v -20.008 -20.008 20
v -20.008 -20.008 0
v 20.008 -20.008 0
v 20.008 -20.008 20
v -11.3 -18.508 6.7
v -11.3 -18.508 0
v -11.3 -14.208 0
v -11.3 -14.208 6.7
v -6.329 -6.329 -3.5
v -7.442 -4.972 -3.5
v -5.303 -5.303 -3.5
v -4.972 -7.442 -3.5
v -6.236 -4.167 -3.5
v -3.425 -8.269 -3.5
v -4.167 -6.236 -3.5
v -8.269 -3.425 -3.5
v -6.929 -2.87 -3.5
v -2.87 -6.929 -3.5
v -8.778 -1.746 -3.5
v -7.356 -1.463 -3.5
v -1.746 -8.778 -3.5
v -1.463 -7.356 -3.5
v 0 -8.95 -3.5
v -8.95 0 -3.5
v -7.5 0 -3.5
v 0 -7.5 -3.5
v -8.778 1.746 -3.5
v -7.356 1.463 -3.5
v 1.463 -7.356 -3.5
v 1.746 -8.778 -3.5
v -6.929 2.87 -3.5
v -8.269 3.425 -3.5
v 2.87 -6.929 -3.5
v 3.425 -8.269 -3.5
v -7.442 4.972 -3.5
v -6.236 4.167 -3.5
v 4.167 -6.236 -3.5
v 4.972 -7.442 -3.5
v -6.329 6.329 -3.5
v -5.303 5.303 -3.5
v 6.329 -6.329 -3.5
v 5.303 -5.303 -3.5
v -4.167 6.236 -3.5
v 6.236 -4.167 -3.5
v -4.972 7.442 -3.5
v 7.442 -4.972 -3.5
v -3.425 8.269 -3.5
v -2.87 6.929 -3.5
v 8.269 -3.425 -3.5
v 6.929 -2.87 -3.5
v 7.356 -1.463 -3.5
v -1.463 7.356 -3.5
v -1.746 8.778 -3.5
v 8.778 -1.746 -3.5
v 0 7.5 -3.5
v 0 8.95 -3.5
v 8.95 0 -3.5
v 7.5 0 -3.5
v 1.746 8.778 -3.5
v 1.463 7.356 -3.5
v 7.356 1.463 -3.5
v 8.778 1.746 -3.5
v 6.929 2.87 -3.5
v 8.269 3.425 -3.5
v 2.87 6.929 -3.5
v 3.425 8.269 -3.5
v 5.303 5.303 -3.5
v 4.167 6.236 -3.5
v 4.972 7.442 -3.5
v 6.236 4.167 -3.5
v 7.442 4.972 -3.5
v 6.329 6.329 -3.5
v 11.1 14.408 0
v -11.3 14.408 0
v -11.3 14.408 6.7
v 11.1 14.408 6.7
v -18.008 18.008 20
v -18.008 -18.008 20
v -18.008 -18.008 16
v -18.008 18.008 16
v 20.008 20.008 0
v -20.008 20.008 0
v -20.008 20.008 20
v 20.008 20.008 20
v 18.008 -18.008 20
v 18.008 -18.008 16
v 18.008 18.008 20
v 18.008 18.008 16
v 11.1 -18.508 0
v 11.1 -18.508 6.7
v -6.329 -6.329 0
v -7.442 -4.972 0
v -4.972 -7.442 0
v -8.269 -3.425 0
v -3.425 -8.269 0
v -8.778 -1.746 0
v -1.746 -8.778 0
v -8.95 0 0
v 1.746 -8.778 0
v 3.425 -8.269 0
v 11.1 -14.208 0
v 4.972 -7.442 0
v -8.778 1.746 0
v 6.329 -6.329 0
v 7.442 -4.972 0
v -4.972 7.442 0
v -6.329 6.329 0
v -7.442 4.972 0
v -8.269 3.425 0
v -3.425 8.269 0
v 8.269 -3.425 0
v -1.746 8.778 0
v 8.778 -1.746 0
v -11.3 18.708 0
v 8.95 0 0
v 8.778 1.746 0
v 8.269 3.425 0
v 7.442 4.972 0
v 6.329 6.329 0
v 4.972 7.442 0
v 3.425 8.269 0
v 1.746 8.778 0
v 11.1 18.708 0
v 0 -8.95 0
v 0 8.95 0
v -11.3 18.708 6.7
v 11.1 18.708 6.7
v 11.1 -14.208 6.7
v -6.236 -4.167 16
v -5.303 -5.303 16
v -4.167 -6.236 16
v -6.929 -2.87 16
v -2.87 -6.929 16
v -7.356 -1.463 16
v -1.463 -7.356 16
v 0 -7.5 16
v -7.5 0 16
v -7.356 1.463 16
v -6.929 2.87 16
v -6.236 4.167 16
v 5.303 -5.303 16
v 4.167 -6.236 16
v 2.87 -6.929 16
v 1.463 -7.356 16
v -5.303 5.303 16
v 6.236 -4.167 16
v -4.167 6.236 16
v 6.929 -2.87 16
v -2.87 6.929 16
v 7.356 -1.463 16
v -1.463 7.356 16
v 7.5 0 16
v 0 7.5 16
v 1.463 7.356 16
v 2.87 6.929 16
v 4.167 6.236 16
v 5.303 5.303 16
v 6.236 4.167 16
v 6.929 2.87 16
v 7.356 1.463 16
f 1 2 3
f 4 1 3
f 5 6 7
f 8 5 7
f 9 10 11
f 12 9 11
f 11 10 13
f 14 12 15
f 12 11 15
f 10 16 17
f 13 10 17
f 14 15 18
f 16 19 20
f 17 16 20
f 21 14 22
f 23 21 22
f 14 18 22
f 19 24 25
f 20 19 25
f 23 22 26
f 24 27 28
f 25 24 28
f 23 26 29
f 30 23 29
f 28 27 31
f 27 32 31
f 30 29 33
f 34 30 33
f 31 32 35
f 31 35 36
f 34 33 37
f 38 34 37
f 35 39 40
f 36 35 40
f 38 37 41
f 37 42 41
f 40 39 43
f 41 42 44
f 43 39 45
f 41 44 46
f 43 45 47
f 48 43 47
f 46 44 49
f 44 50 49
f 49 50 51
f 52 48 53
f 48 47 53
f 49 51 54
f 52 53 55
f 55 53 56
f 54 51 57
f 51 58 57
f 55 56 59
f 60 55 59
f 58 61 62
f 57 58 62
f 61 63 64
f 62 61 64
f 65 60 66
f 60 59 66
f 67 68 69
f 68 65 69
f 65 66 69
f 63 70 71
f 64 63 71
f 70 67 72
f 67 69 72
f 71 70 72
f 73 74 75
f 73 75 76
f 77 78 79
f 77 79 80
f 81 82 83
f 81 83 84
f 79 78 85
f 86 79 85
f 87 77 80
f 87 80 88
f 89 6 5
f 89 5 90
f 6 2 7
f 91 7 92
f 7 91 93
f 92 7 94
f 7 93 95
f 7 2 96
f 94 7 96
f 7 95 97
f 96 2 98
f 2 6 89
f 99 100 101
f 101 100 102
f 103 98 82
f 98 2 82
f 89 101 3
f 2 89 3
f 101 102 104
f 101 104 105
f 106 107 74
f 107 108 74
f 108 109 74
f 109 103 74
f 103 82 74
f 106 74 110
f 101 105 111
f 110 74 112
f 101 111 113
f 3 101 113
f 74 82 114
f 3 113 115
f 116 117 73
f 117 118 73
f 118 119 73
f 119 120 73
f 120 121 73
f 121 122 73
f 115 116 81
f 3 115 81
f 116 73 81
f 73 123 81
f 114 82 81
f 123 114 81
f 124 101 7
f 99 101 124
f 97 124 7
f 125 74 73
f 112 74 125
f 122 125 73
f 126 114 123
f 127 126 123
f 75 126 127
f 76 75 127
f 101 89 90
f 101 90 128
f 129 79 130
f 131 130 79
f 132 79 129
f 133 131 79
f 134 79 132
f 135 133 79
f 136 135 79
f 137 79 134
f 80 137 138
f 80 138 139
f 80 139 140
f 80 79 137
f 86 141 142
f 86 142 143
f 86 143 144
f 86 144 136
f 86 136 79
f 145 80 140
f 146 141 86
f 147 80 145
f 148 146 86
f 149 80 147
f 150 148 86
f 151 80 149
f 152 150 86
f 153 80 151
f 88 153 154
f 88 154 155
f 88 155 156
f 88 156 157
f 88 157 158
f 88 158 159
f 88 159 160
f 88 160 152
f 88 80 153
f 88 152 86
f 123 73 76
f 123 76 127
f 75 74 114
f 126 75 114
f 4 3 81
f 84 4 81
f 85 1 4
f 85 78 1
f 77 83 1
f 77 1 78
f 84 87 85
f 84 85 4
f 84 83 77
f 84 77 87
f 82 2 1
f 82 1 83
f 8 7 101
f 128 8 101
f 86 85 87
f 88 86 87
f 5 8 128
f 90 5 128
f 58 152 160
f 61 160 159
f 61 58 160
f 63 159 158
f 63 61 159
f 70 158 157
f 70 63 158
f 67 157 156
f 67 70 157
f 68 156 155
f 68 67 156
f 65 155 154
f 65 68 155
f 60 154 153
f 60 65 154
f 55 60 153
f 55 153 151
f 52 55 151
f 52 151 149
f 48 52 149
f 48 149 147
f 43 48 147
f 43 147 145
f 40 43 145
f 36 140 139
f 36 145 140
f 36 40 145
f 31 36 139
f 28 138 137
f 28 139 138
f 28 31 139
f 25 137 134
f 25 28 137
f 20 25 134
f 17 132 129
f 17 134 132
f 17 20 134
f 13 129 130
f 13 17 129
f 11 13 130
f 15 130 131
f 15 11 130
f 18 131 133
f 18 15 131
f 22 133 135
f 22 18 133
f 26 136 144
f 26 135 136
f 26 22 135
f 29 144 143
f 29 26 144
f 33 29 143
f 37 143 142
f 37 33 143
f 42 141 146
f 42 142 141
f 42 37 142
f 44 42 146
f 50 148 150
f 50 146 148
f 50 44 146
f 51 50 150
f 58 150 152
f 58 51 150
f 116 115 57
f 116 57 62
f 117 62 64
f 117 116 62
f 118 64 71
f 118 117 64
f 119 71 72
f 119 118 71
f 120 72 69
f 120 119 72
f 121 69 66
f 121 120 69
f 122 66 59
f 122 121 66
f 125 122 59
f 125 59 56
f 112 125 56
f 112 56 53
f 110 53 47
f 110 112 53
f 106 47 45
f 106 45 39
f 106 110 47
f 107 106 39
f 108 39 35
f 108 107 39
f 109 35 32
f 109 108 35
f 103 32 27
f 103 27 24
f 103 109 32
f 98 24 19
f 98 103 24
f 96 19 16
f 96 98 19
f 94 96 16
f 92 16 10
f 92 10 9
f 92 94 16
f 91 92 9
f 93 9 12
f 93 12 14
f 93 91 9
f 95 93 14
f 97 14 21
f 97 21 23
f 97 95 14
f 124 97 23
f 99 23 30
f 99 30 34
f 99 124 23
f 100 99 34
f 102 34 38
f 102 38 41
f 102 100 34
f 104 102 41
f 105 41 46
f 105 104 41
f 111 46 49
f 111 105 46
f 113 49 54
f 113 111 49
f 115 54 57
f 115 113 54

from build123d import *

# Parameters (mm, degrees)
SKETCH1_W           = 40.015172748
SKETCH1_H           = 40.015172748
BOSS_EXTRUDE1_DEPTH = 20
SKETCH1_3_R         = 8.95
SKETCH1_3_R_2       = 7.5
BOSS_EXTRUDE2_DEPTH = 3.5
SKETCH1_4_R         = 7.5
CUT_EXTRUDE1_DEPTH  = 35.649776695
SKETCH1_5_W         = 22.4
SKETCH1_5_H         = 4.3
CUT_EXTRUDE2_DEPTH  = 6.7
SKETCH7_W           = 36.015172748
SKETCH7_H           = 36.015172748
CUT_EXTRUDE3_DEPTH  = 4


with BuildPart() as part:
    # Sketch1 → Boss-Extrude1 (new body)
    with BuildSketch(Plane.XY):
        Rectangle(SKETCH1_W, SKETCH1_H)
    extrude(amount=BOSS_EXTRUDE1_DEPTH)

    # Sketch1<3> → Boss-Extrude2 (add)
    with BuildSketch(Plane.XY):
        Circle(SKETCH1_3_R)
        Circle(SKETCH1_3_R_2, mode=Mode.SUBTRACT)
    extrude(amount=-BOSS_EXTRUDE2_DEPTH)

    # Sketch1<4> → Cut-Extrude1 (cut, through all)
    with BuildSketch(Plane.XY):
        Circle(SKETCH1_4_R)
    extrude(amount=CUT_EXTRUDE1_DEPTH, mode=Mode.SUBTRACT)

    # Sketch1<5> → Cut-Extrude2 (cut)
    with BuildSketch(Plane.XY):
        with Locations((-0.1, -16.357586374)):
            Rectangle(SKETCH1_5_W, SKETCH1_5_H)
        with Locations((-0.1, 16.557586374)):
            Rectangle(SKETCH1_5_W, SKETCH1_5_H)
    extrude(amount=CUT_EXTRUDE2_DEPTH, mode=Mode.SUBTRACT)

    # Sketch7 → Cut-Extrude3 (cut)
    with BuildSketch(Plane.XY.offset(20)):
        Rectangle(SKETCH7_W, SKETCH7_H)
    extrude(amount=-CUT_EXTRUDE3_DEPTH, mode=Mode.SUBTRACT)


solid = part.part
